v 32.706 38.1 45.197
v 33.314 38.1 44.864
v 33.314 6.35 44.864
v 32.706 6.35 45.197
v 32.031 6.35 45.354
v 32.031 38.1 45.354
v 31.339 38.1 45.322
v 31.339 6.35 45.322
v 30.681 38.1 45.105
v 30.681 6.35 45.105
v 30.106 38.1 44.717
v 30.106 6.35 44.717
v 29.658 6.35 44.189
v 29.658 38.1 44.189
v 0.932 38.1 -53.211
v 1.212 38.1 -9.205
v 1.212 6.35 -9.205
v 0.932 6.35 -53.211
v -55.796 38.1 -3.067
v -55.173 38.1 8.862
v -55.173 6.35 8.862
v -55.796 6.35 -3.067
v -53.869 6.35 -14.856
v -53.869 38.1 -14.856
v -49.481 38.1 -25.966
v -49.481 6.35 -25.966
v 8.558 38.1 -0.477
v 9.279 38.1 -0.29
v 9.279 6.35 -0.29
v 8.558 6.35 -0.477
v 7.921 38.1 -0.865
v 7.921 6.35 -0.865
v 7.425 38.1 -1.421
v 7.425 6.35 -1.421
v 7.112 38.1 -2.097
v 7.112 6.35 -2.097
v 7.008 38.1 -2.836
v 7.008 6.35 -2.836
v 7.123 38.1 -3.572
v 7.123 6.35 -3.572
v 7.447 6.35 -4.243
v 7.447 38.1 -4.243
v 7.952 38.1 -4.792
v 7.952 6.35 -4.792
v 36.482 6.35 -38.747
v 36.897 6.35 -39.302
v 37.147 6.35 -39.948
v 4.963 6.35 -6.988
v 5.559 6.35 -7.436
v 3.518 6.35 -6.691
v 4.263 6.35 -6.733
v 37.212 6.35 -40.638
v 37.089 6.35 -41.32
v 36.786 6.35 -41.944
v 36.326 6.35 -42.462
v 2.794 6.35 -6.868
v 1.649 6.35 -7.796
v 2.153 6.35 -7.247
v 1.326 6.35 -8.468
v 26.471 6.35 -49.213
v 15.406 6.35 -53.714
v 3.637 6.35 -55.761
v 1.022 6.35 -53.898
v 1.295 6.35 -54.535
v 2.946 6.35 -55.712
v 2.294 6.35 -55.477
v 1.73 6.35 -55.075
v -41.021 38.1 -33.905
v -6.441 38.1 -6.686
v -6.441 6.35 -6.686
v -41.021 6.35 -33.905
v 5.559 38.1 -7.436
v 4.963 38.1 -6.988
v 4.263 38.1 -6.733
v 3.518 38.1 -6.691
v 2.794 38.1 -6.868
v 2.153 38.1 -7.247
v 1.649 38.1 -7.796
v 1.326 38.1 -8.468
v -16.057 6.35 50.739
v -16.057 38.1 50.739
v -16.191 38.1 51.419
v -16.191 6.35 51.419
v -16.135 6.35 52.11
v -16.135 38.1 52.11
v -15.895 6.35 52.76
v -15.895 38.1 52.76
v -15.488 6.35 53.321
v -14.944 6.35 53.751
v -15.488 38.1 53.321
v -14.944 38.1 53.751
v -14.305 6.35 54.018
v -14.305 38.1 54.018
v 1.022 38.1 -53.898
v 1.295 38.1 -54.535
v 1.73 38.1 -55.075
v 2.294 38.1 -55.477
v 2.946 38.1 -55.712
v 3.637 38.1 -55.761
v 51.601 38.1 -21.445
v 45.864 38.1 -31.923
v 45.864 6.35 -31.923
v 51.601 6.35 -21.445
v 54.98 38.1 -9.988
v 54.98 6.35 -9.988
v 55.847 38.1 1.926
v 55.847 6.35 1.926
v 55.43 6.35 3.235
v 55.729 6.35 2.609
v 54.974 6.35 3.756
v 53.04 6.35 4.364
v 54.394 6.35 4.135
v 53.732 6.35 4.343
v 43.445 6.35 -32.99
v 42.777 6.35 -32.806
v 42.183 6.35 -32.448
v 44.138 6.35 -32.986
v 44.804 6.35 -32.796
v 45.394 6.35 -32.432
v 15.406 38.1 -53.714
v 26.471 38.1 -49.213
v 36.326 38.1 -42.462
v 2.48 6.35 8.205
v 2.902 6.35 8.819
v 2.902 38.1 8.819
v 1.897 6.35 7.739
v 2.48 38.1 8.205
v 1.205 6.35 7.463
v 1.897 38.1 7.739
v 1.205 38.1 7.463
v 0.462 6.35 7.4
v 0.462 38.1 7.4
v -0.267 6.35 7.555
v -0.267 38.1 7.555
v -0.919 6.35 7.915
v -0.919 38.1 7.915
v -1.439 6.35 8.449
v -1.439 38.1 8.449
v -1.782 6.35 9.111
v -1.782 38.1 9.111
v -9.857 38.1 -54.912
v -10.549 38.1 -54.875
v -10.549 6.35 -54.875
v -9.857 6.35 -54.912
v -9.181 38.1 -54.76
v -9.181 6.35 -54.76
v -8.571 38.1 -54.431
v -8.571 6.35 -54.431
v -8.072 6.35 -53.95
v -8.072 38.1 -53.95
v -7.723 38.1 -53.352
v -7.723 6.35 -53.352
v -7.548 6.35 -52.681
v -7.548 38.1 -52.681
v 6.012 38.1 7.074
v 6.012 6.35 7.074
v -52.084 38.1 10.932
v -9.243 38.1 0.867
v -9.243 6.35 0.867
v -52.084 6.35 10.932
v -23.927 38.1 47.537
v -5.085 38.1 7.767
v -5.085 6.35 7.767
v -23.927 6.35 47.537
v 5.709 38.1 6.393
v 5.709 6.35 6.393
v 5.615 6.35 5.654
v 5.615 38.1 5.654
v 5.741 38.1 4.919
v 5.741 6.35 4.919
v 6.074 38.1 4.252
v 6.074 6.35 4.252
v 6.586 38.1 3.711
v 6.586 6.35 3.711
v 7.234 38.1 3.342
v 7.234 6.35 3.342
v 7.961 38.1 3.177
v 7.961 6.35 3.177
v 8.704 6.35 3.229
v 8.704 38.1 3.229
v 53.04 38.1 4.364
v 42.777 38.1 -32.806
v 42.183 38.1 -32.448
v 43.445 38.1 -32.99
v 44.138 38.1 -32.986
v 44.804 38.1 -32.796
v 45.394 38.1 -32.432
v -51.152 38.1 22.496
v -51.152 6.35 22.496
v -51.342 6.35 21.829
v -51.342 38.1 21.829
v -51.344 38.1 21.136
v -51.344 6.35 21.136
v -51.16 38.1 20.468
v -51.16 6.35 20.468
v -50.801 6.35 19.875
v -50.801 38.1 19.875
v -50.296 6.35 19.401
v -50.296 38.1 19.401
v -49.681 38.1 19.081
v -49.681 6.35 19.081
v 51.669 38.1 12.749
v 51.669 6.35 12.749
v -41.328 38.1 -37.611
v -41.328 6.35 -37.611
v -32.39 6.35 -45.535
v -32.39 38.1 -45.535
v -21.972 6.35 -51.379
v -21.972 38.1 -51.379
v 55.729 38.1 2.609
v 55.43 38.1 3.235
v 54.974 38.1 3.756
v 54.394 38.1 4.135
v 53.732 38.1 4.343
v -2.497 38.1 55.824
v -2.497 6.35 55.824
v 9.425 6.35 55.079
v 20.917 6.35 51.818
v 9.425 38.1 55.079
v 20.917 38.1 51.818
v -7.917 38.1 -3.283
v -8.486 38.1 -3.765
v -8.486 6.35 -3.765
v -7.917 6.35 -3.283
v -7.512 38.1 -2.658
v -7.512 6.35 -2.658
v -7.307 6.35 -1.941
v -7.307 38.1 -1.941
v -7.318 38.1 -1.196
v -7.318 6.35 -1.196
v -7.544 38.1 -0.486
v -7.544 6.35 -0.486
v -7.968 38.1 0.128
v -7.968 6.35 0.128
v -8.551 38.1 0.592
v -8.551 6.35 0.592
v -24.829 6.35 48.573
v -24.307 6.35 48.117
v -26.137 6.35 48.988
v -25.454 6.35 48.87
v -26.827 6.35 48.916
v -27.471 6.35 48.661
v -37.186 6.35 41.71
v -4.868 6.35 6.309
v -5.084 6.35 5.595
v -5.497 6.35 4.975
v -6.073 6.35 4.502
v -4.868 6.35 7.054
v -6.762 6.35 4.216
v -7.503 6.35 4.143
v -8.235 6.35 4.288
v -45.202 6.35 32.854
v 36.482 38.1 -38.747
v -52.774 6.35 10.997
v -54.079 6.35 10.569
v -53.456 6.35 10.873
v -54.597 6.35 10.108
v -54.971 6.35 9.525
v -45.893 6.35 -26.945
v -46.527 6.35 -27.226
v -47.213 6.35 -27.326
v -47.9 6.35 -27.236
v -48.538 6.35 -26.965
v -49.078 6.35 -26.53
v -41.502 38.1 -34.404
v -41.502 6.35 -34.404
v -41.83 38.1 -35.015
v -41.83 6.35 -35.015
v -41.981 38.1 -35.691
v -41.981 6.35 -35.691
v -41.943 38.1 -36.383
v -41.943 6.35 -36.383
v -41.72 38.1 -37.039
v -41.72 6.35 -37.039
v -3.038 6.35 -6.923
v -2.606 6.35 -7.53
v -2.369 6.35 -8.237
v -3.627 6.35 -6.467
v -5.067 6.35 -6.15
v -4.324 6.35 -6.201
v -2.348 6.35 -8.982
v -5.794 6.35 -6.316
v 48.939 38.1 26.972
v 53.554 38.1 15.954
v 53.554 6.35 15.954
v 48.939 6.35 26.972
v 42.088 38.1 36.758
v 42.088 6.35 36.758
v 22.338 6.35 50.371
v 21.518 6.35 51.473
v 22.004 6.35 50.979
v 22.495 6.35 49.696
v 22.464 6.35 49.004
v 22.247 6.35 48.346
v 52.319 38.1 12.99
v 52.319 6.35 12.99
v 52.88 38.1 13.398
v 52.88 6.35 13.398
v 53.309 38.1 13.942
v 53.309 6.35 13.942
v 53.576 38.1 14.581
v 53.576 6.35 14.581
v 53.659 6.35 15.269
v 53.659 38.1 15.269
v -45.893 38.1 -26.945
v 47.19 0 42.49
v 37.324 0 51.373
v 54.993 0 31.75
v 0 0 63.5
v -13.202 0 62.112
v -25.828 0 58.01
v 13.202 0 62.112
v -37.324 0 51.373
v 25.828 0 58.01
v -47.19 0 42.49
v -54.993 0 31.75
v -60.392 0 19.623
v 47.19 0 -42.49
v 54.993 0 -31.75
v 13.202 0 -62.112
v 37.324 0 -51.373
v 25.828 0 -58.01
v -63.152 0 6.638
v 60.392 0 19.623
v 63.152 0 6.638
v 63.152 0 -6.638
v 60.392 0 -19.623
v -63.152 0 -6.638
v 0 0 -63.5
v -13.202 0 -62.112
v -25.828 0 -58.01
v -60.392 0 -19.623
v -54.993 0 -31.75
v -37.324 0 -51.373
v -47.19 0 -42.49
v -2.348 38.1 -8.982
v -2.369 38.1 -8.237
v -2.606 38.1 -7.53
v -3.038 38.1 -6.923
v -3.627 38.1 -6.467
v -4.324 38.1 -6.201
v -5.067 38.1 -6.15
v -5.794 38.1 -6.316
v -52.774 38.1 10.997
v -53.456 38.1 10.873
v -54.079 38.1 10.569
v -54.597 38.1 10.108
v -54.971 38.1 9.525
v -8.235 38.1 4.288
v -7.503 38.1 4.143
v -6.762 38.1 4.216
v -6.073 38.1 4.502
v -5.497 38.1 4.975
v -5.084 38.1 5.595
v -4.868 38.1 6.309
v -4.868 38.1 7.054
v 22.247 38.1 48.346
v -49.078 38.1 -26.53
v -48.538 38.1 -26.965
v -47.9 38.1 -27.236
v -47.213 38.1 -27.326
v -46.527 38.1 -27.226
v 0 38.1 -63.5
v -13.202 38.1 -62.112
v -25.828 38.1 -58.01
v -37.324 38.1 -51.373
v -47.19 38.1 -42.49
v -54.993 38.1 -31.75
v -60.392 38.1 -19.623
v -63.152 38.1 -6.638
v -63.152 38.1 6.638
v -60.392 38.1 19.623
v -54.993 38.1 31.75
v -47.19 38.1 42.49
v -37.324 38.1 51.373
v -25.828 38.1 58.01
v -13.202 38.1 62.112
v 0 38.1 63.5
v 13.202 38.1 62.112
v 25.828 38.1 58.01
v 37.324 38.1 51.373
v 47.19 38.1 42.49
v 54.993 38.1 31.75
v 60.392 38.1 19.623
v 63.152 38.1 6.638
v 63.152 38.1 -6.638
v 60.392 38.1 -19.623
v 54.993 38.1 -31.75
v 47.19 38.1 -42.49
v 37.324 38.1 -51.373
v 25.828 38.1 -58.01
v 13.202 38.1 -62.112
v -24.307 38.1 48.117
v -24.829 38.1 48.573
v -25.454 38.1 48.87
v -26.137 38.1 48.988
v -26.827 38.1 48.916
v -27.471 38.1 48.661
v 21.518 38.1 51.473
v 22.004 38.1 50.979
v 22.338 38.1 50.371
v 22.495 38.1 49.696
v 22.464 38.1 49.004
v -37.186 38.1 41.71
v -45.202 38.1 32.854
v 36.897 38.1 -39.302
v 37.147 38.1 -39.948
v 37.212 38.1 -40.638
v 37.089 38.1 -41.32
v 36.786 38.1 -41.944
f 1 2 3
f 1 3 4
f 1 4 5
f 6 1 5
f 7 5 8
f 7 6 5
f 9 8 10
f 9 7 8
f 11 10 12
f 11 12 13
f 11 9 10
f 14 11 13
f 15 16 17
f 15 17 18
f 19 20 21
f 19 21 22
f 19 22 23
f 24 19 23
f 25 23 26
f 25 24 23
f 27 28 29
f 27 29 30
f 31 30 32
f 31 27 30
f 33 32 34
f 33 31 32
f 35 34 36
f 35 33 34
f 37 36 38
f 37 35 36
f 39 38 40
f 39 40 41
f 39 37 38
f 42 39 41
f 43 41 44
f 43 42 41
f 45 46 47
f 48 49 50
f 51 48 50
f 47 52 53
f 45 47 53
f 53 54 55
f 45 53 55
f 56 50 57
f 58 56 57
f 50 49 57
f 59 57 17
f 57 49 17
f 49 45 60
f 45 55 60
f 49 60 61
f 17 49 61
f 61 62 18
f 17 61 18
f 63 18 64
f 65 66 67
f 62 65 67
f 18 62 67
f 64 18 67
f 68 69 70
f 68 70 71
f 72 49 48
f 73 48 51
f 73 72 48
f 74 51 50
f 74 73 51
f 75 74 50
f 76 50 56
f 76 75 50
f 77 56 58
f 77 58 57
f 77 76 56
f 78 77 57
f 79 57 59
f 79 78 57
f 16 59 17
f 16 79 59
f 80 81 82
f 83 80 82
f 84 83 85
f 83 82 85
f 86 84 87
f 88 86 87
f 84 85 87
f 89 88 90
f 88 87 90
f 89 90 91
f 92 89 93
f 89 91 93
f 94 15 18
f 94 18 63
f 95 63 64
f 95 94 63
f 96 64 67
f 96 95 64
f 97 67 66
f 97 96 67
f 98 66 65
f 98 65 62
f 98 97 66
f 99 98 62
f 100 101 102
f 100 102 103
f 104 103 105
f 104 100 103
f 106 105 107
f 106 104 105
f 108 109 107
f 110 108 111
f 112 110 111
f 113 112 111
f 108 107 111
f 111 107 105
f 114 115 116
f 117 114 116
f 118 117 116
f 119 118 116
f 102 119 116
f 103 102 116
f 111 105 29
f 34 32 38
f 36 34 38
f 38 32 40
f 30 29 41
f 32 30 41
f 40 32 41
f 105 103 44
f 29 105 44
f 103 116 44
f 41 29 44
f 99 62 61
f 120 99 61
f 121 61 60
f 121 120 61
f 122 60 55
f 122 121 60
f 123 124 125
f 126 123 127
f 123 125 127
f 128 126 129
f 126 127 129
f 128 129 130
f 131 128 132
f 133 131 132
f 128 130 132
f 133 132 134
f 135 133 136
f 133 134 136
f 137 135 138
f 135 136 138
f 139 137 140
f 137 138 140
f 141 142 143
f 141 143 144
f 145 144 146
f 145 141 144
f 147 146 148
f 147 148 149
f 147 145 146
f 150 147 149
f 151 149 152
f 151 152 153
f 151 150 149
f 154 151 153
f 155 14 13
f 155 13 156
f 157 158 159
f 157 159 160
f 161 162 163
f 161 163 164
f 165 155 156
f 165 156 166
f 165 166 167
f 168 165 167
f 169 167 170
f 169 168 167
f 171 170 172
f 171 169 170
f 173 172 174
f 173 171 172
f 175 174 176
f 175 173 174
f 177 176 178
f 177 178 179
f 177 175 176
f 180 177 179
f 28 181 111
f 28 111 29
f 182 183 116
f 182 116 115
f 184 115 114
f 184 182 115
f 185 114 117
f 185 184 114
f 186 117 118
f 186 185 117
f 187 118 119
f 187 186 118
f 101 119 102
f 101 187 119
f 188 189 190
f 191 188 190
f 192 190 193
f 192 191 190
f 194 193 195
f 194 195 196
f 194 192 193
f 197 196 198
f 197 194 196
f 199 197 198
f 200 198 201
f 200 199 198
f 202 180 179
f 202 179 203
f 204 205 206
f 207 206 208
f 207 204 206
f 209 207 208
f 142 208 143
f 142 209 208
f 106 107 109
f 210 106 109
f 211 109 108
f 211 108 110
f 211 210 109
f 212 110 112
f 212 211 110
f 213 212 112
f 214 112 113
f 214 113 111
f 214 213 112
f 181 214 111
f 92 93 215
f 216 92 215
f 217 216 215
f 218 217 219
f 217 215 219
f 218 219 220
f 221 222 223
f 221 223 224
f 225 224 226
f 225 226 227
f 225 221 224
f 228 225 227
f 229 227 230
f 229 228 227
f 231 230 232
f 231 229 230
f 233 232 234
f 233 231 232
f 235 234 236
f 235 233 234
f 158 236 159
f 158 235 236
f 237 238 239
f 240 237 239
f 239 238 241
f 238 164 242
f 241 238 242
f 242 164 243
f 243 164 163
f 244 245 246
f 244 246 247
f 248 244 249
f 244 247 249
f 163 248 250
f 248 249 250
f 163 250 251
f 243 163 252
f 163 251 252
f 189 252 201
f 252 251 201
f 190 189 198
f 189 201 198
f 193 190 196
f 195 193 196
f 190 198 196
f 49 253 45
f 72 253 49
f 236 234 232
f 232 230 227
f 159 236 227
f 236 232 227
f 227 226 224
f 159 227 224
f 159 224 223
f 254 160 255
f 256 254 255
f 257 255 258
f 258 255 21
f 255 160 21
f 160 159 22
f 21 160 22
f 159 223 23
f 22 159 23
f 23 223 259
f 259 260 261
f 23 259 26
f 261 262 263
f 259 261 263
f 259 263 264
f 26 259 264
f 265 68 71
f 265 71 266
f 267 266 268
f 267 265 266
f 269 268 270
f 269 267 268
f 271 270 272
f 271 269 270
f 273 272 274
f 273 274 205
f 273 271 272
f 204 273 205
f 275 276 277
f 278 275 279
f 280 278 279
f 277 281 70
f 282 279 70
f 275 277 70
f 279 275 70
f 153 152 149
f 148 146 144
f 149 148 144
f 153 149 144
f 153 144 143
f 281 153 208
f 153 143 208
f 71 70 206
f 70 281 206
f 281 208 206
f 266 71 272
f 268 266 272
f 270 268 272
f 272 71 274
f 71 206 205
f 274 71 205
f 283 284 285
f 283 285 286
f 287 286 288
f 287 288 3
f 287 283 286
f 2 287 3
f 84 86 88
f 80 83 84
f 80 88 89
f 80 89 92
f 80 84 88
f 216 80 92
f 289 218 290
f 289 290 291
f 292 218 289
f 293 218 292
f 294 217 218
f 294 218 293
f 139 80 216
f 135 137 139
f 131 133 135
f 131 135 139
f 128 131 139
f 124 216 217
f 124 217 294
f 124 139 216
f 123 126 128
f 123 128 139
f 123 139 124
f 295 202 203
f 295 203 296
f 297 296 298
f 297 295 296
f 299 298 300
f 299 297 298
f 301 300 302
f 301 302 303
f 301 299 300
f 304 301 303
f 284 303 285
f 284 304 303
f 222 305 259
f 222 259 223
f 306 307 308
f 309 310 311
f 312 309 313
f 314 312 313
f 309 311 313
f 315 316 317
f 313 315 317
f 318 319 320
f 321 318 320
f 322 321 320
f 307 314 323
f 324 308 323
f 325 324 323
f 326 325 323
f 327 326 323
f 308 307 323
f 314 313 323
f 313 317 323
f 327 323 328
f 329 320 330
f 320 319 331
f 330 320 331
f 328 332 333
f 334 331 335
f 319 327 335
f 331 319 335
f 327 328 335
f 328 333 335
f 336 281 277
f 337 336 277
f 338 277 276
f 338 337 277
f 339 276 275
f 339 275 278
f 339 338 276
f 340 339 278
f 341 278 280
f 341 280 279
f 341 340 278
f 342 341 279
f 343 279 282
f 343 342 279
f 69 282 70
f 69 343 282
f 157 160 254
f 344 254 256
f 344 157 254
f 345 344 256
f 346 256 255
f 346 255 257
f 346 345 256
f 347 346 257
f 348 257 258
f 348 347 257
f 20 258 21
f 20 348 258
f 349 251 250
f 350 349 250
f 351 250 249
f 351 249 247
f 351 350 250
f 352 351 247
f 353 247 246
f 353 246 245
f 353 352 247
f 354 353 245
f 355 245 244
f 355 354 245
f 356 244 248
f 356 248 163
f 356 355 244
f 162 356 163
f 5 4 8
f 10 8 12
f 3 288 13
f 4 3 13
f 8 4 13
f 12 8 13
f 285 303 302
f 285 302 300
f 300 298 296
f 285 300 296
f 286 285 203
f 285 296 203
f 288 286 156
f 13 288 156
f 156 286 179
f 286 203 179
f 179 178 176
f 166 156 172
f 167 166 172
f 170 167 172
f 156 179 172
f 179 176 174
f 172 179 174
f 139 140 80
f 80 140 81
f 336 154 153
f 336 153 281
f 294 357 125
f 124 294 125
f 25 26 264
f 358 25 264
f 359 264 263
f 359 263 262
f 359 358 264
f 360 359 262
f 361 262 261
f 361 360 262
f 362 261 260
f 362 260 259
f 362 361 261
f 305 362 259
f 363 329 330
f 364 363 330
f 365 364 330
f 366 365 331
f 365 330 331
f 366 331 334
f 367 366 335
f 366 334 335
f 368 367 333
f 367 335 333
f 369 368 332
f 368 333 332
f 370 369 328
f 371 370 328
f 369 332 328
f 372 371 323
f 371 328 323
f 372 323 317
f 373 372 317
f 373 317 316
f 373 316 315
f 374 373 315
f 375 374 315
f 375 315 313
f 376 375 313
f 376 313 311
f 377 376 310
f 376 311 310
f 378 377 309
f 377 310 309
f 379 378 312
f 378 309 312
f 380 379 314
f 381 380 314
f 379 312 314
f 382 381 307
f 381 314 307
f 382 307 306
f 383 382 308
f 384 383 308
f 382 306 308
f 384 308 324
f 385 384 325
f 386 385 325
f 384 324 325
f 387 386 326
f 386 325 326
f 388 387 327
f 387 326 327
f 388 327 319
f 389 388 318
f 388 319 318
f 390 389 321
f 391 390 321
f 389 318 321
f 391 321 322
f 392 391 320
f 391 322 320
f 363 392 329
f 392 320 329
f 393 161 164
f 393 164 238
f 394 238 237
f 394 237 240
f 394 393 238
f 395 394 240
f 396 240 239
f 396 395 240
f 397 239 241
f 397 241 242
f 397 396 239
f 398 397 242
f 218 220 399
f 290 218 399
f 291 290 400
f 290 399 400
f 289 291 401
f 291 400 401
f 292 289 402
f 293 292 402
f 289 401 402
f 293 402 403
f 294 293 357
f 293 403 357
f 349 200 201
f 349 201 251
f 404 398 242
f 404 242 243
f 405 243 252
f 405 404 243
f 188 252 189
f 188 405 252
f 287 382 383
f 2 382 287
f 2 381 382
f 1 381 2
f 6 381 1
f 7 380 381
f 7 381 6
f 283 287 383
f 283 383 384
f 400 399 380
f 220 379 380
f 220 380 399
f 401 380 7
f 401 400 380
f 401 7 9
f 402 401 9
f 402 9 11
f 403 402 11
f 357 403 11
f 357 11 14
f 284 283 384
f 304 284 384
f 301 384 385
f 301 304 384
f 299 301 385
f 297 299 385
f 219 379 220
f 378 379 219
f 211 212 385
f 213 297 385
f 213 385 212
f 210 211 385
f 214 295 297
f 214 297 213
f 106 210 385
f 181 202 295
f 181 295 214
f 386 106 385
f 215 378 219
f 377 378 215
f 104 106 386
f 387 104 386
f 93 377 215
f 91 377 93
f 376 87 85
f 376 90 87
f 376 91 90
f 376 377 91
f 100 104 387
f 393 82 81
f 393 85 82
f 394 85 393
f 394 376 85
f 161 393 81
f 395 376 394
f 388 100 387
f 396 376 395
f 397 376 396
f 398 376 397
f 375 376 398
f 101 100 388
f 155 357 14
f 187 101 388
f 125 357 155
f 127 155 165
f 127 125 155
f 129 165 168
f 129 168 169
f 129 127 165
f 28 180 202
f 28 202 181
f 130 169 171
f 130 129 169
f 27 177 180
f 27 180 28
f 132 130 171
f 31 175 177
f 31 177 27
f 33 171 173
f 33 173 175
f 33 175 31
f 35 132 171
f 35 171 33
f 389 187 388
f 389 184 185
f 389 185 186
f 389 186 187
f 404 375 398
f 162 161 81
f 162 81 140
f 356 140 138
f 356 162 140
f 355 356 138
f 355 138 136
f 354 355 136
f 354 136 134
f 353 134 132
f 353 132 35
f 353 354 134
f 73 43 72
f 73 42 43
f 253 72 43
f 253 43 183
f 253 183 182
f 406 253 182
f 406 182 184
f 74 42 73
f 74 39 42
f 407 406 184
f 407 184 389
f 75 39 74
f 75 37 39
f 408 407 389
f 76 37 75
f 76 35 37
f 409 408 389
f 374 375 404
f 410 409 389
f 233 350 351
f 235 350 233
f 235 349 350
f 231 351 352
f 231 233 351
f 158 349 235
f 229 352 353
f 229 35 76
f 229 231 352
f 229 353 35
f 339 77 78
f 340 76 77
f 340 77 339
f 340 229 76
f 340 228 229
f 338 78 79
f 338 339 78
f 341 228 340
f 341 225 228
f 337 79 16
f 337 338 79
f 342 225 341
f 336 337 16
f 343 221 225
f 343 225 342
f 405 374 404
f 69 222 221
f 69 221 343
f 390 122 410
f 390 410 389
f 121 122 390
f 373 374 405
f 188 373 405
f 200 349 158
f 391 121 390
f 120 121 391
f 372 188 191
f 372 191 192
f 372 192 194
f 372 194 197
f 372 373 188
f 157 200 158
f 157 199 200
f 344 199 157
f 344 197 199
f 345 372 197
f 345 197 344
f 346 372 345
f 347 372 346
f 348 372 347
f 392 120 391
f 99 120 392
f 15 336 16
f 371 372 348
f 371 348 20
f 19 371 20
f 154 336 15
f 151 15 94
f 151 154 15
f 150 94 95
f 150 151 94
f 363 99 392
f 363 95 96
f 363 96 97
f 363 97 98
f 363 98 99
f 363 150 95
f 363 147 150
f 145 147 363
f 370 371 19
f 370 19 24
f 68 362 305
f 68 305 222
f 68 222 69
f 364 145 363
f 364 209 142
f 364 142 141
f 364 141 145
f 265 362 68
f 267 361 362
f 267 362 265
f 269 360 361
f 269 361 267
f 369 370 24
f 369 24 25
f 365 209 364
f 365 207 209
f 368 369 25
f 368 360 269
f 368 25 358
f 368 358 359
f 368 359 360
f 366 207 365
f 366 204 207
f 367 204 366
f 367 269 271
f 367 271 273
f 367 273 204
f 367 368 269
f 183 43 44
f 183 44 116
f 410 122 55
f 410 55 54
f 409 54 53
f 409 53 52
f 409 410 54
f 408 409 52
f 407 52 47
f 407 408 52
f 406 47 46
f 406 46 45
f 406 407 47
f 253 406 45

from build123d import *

# Parameters (mm, degrees)
SKETCH1_R           = 63.5
BOSS_EXTRUDE1_DEPTH = 38.1
CUT_EXTRUDE2_DEPTH  = 31.75


with BuildPart() as part:
    # Sketch1 → Boss-Extrude1 (new body)
    with BuildSketch(Plane(origin=(0, 0, 0), x_dir=(1, 0, 0), z_dir=(0, 1, 0))):
        with Locations(Location((0, 0, 0), (0, 0, 90))):
            Circle(SKETCH1_R)
    extrude(amount=BOSS_EXTRUDE1_DEPTH)

    # Sketch2 → Cut-Extrude2 (cut)
    with BuildSketch(Plane(origin=(0, 38.1, 0), x_dir=(1, 0, 0), z_dir=(0, 1, 0))):
        with BuildLine():
            Line((-1.7819572, -9.111319007), (-16.057301334, -50.738697991))
            ThreePointArc((-16.057301334, -50.738697991), (-15.89484722, -52.75977688), (-14.304875125, -54.018005773))
            ThreePointArc((-14.304875125, -54.018005773), (3.484226214, -55.771270092), (20.916794468, -51.817584942))
            ThreePointArc((20.916794468, -51.817584942), (22.337802979, -50.371249564), (22.247447967, -48.345666393))
            Line((22.247447967, -48.345666393), (2.902107489, -8.818689111))
            ThreePointArc((2.902107489, -8.818689111), (0.462316687, -7.400205158), (-1.7819572, -9.111319007))
        make_face()
        with BuildLine():
            Line((8.704163204, -3.229403726), (51.669220951, -12.749274735))
            ThreePointArc((51.669220951, -12.749274735), (53.309221074, -13.941562792), (53.554027291, -15.954327341))
            ThreePointArc((53.554027291, -15.954327341), (45.776114287, -32.048740393), (33.314033776, -44.863677441))
            ThreePointArc((33.314033776, -44.863677441), (31.338979429, -45.322274799), (29.657547842, -44.189164464))
            Line((29.657547842, -44.189164464), (6.012483905, -7.074004722))
            ThreePointArc((6.012483905, -7.074004722), (6.073963109, -4.252498707), (8.704163204, -3.229403726))
        make_face()
        with BuildLine():
            Line((7.951806494, 4.791688532), (42.1830167, 32.447580836))
            ThreePointArc((42.1830167, 32.447580836), (44.13770839, 32.986405118), (45.863985261, 31.922864157))
            ThreePointArc((45.863985261, 31.922864157), (53.597654639, 15.807144497), (55.846795761, -1.926084944))
            ThreePointArc((55.846795761, -1.926084944), (54.973915369, -3.756175388), (53.039658589, -4.3642888))
            Line((53.039658589, -4.3642888), (9.279401997, 0.290179402))
            ThreePointArc((9.279401997, 0.290179402), (7.111791423, 2.097426005), (7.951806494, 4.791688532))
        make_face()
        with BuildLine():
            Line((1.211577307, 9.204541593), (0.932140496, 53.210746228))
            ThreePointArc((0.932140496, 53.210746228), (1.729601044, 55.074937175), (3.637426875, 55.761487836))
            ThreePointArc((3.637426875, 55.761487836), (21.059067856, 51.759927174), (36.325781471, 42.461888801))
            ThreePointArc((36.325781471, 42.461888801), (37.212371773, 40.638400701), (36.481824607, 38.746985345))
            Line((36.481824607, 38.746985345), (5.55874112, 7.435852518))
            ThreePointArc((5.55874112, 7.435852518), (2.794295742, 6.867946156), (1.211577307, 9.204541593))
        make_face()
        with BuildLine():
            Line((-6.440994304, 6.686187096), (-41.020656513, 33.905134408))
            ThreePointArc((-41.020656513, 33.905134408), (-41.980931166, 35.690918215), (-41.328188139, 37.610573848))
            ThreePointArc((-41.328188139, 37.610573848), (-27.33742655, 48.736428979), (-10.549287178, 54.875194214))
            ThreePointArc((-10.549287178, 54.875194214), (-8.570846762, 54.431432191), (-7.547567398, 52.680989231))
            Line((-7.547567398, 52.680989231), (-2.347765198, 8.982177024))
            ThreePointArc((-2.347765198, 8.982177024), (-3.627361626, 6.466762771), (-6.440994304, 6.686187096))
        make_face()
        with BuildLine():
            Line((-9.243365832, -0.867002658), (-52.084062499, -10.931735159))
            ThreePointArc((-52.084062499, -10.931735159), (-54.078965953, -10.569090123), (-55.172834542, -8.861869364))
            ThreePointArc((-55.172834542, -8.861869364), (-55.148281182, 9.013405721), (-49.480527415, 25.966359134))
            ThreePointArc((-49.480527415, 25.966359134), (-47.900042872, 27.236485042), (-45.89348721, 26.94513373))
            Line((-45.89348721, 26.94513373), (-8.486356436, 3.764739028))
            ThreePointArc((-8.486356436, 3.764739028), (-7.317541705, 1.195975121), (-9.243365832, -0.867002658))
        make_face()
        with BuildLine():
            Line((-5.085294358, -7.767321727), (-23.927107102, -47.536785185))
            ThreePointArc((-23.927107102, -47.536785185), (-25.454436367, -48.870358028), (-27.471211214, -48.661144195))
            ThreePointArc((-27.471211214, -48.661144195), (-41.431355264, -37.496895885), (-51.15192129, -22.495673991))
            ThreePointArc((-51.15192129, -22.495673991), (-51.159529717, -20.468090867), (-49.680675096, -19.080957051))
            Line((-49.680675096, -19.080957051), (-8.234548188, -4.287624243))
            ThreePointArc((-8.234548188, -4.287624243), (-5.49746363, -4.975406188), (-5.085294358, -7.767321727))
        make_face()
    extrude(amount=-CUT_EXTRUDE2_DEPTH, mode=Mode.SUBTRACT)


solid = part.part
